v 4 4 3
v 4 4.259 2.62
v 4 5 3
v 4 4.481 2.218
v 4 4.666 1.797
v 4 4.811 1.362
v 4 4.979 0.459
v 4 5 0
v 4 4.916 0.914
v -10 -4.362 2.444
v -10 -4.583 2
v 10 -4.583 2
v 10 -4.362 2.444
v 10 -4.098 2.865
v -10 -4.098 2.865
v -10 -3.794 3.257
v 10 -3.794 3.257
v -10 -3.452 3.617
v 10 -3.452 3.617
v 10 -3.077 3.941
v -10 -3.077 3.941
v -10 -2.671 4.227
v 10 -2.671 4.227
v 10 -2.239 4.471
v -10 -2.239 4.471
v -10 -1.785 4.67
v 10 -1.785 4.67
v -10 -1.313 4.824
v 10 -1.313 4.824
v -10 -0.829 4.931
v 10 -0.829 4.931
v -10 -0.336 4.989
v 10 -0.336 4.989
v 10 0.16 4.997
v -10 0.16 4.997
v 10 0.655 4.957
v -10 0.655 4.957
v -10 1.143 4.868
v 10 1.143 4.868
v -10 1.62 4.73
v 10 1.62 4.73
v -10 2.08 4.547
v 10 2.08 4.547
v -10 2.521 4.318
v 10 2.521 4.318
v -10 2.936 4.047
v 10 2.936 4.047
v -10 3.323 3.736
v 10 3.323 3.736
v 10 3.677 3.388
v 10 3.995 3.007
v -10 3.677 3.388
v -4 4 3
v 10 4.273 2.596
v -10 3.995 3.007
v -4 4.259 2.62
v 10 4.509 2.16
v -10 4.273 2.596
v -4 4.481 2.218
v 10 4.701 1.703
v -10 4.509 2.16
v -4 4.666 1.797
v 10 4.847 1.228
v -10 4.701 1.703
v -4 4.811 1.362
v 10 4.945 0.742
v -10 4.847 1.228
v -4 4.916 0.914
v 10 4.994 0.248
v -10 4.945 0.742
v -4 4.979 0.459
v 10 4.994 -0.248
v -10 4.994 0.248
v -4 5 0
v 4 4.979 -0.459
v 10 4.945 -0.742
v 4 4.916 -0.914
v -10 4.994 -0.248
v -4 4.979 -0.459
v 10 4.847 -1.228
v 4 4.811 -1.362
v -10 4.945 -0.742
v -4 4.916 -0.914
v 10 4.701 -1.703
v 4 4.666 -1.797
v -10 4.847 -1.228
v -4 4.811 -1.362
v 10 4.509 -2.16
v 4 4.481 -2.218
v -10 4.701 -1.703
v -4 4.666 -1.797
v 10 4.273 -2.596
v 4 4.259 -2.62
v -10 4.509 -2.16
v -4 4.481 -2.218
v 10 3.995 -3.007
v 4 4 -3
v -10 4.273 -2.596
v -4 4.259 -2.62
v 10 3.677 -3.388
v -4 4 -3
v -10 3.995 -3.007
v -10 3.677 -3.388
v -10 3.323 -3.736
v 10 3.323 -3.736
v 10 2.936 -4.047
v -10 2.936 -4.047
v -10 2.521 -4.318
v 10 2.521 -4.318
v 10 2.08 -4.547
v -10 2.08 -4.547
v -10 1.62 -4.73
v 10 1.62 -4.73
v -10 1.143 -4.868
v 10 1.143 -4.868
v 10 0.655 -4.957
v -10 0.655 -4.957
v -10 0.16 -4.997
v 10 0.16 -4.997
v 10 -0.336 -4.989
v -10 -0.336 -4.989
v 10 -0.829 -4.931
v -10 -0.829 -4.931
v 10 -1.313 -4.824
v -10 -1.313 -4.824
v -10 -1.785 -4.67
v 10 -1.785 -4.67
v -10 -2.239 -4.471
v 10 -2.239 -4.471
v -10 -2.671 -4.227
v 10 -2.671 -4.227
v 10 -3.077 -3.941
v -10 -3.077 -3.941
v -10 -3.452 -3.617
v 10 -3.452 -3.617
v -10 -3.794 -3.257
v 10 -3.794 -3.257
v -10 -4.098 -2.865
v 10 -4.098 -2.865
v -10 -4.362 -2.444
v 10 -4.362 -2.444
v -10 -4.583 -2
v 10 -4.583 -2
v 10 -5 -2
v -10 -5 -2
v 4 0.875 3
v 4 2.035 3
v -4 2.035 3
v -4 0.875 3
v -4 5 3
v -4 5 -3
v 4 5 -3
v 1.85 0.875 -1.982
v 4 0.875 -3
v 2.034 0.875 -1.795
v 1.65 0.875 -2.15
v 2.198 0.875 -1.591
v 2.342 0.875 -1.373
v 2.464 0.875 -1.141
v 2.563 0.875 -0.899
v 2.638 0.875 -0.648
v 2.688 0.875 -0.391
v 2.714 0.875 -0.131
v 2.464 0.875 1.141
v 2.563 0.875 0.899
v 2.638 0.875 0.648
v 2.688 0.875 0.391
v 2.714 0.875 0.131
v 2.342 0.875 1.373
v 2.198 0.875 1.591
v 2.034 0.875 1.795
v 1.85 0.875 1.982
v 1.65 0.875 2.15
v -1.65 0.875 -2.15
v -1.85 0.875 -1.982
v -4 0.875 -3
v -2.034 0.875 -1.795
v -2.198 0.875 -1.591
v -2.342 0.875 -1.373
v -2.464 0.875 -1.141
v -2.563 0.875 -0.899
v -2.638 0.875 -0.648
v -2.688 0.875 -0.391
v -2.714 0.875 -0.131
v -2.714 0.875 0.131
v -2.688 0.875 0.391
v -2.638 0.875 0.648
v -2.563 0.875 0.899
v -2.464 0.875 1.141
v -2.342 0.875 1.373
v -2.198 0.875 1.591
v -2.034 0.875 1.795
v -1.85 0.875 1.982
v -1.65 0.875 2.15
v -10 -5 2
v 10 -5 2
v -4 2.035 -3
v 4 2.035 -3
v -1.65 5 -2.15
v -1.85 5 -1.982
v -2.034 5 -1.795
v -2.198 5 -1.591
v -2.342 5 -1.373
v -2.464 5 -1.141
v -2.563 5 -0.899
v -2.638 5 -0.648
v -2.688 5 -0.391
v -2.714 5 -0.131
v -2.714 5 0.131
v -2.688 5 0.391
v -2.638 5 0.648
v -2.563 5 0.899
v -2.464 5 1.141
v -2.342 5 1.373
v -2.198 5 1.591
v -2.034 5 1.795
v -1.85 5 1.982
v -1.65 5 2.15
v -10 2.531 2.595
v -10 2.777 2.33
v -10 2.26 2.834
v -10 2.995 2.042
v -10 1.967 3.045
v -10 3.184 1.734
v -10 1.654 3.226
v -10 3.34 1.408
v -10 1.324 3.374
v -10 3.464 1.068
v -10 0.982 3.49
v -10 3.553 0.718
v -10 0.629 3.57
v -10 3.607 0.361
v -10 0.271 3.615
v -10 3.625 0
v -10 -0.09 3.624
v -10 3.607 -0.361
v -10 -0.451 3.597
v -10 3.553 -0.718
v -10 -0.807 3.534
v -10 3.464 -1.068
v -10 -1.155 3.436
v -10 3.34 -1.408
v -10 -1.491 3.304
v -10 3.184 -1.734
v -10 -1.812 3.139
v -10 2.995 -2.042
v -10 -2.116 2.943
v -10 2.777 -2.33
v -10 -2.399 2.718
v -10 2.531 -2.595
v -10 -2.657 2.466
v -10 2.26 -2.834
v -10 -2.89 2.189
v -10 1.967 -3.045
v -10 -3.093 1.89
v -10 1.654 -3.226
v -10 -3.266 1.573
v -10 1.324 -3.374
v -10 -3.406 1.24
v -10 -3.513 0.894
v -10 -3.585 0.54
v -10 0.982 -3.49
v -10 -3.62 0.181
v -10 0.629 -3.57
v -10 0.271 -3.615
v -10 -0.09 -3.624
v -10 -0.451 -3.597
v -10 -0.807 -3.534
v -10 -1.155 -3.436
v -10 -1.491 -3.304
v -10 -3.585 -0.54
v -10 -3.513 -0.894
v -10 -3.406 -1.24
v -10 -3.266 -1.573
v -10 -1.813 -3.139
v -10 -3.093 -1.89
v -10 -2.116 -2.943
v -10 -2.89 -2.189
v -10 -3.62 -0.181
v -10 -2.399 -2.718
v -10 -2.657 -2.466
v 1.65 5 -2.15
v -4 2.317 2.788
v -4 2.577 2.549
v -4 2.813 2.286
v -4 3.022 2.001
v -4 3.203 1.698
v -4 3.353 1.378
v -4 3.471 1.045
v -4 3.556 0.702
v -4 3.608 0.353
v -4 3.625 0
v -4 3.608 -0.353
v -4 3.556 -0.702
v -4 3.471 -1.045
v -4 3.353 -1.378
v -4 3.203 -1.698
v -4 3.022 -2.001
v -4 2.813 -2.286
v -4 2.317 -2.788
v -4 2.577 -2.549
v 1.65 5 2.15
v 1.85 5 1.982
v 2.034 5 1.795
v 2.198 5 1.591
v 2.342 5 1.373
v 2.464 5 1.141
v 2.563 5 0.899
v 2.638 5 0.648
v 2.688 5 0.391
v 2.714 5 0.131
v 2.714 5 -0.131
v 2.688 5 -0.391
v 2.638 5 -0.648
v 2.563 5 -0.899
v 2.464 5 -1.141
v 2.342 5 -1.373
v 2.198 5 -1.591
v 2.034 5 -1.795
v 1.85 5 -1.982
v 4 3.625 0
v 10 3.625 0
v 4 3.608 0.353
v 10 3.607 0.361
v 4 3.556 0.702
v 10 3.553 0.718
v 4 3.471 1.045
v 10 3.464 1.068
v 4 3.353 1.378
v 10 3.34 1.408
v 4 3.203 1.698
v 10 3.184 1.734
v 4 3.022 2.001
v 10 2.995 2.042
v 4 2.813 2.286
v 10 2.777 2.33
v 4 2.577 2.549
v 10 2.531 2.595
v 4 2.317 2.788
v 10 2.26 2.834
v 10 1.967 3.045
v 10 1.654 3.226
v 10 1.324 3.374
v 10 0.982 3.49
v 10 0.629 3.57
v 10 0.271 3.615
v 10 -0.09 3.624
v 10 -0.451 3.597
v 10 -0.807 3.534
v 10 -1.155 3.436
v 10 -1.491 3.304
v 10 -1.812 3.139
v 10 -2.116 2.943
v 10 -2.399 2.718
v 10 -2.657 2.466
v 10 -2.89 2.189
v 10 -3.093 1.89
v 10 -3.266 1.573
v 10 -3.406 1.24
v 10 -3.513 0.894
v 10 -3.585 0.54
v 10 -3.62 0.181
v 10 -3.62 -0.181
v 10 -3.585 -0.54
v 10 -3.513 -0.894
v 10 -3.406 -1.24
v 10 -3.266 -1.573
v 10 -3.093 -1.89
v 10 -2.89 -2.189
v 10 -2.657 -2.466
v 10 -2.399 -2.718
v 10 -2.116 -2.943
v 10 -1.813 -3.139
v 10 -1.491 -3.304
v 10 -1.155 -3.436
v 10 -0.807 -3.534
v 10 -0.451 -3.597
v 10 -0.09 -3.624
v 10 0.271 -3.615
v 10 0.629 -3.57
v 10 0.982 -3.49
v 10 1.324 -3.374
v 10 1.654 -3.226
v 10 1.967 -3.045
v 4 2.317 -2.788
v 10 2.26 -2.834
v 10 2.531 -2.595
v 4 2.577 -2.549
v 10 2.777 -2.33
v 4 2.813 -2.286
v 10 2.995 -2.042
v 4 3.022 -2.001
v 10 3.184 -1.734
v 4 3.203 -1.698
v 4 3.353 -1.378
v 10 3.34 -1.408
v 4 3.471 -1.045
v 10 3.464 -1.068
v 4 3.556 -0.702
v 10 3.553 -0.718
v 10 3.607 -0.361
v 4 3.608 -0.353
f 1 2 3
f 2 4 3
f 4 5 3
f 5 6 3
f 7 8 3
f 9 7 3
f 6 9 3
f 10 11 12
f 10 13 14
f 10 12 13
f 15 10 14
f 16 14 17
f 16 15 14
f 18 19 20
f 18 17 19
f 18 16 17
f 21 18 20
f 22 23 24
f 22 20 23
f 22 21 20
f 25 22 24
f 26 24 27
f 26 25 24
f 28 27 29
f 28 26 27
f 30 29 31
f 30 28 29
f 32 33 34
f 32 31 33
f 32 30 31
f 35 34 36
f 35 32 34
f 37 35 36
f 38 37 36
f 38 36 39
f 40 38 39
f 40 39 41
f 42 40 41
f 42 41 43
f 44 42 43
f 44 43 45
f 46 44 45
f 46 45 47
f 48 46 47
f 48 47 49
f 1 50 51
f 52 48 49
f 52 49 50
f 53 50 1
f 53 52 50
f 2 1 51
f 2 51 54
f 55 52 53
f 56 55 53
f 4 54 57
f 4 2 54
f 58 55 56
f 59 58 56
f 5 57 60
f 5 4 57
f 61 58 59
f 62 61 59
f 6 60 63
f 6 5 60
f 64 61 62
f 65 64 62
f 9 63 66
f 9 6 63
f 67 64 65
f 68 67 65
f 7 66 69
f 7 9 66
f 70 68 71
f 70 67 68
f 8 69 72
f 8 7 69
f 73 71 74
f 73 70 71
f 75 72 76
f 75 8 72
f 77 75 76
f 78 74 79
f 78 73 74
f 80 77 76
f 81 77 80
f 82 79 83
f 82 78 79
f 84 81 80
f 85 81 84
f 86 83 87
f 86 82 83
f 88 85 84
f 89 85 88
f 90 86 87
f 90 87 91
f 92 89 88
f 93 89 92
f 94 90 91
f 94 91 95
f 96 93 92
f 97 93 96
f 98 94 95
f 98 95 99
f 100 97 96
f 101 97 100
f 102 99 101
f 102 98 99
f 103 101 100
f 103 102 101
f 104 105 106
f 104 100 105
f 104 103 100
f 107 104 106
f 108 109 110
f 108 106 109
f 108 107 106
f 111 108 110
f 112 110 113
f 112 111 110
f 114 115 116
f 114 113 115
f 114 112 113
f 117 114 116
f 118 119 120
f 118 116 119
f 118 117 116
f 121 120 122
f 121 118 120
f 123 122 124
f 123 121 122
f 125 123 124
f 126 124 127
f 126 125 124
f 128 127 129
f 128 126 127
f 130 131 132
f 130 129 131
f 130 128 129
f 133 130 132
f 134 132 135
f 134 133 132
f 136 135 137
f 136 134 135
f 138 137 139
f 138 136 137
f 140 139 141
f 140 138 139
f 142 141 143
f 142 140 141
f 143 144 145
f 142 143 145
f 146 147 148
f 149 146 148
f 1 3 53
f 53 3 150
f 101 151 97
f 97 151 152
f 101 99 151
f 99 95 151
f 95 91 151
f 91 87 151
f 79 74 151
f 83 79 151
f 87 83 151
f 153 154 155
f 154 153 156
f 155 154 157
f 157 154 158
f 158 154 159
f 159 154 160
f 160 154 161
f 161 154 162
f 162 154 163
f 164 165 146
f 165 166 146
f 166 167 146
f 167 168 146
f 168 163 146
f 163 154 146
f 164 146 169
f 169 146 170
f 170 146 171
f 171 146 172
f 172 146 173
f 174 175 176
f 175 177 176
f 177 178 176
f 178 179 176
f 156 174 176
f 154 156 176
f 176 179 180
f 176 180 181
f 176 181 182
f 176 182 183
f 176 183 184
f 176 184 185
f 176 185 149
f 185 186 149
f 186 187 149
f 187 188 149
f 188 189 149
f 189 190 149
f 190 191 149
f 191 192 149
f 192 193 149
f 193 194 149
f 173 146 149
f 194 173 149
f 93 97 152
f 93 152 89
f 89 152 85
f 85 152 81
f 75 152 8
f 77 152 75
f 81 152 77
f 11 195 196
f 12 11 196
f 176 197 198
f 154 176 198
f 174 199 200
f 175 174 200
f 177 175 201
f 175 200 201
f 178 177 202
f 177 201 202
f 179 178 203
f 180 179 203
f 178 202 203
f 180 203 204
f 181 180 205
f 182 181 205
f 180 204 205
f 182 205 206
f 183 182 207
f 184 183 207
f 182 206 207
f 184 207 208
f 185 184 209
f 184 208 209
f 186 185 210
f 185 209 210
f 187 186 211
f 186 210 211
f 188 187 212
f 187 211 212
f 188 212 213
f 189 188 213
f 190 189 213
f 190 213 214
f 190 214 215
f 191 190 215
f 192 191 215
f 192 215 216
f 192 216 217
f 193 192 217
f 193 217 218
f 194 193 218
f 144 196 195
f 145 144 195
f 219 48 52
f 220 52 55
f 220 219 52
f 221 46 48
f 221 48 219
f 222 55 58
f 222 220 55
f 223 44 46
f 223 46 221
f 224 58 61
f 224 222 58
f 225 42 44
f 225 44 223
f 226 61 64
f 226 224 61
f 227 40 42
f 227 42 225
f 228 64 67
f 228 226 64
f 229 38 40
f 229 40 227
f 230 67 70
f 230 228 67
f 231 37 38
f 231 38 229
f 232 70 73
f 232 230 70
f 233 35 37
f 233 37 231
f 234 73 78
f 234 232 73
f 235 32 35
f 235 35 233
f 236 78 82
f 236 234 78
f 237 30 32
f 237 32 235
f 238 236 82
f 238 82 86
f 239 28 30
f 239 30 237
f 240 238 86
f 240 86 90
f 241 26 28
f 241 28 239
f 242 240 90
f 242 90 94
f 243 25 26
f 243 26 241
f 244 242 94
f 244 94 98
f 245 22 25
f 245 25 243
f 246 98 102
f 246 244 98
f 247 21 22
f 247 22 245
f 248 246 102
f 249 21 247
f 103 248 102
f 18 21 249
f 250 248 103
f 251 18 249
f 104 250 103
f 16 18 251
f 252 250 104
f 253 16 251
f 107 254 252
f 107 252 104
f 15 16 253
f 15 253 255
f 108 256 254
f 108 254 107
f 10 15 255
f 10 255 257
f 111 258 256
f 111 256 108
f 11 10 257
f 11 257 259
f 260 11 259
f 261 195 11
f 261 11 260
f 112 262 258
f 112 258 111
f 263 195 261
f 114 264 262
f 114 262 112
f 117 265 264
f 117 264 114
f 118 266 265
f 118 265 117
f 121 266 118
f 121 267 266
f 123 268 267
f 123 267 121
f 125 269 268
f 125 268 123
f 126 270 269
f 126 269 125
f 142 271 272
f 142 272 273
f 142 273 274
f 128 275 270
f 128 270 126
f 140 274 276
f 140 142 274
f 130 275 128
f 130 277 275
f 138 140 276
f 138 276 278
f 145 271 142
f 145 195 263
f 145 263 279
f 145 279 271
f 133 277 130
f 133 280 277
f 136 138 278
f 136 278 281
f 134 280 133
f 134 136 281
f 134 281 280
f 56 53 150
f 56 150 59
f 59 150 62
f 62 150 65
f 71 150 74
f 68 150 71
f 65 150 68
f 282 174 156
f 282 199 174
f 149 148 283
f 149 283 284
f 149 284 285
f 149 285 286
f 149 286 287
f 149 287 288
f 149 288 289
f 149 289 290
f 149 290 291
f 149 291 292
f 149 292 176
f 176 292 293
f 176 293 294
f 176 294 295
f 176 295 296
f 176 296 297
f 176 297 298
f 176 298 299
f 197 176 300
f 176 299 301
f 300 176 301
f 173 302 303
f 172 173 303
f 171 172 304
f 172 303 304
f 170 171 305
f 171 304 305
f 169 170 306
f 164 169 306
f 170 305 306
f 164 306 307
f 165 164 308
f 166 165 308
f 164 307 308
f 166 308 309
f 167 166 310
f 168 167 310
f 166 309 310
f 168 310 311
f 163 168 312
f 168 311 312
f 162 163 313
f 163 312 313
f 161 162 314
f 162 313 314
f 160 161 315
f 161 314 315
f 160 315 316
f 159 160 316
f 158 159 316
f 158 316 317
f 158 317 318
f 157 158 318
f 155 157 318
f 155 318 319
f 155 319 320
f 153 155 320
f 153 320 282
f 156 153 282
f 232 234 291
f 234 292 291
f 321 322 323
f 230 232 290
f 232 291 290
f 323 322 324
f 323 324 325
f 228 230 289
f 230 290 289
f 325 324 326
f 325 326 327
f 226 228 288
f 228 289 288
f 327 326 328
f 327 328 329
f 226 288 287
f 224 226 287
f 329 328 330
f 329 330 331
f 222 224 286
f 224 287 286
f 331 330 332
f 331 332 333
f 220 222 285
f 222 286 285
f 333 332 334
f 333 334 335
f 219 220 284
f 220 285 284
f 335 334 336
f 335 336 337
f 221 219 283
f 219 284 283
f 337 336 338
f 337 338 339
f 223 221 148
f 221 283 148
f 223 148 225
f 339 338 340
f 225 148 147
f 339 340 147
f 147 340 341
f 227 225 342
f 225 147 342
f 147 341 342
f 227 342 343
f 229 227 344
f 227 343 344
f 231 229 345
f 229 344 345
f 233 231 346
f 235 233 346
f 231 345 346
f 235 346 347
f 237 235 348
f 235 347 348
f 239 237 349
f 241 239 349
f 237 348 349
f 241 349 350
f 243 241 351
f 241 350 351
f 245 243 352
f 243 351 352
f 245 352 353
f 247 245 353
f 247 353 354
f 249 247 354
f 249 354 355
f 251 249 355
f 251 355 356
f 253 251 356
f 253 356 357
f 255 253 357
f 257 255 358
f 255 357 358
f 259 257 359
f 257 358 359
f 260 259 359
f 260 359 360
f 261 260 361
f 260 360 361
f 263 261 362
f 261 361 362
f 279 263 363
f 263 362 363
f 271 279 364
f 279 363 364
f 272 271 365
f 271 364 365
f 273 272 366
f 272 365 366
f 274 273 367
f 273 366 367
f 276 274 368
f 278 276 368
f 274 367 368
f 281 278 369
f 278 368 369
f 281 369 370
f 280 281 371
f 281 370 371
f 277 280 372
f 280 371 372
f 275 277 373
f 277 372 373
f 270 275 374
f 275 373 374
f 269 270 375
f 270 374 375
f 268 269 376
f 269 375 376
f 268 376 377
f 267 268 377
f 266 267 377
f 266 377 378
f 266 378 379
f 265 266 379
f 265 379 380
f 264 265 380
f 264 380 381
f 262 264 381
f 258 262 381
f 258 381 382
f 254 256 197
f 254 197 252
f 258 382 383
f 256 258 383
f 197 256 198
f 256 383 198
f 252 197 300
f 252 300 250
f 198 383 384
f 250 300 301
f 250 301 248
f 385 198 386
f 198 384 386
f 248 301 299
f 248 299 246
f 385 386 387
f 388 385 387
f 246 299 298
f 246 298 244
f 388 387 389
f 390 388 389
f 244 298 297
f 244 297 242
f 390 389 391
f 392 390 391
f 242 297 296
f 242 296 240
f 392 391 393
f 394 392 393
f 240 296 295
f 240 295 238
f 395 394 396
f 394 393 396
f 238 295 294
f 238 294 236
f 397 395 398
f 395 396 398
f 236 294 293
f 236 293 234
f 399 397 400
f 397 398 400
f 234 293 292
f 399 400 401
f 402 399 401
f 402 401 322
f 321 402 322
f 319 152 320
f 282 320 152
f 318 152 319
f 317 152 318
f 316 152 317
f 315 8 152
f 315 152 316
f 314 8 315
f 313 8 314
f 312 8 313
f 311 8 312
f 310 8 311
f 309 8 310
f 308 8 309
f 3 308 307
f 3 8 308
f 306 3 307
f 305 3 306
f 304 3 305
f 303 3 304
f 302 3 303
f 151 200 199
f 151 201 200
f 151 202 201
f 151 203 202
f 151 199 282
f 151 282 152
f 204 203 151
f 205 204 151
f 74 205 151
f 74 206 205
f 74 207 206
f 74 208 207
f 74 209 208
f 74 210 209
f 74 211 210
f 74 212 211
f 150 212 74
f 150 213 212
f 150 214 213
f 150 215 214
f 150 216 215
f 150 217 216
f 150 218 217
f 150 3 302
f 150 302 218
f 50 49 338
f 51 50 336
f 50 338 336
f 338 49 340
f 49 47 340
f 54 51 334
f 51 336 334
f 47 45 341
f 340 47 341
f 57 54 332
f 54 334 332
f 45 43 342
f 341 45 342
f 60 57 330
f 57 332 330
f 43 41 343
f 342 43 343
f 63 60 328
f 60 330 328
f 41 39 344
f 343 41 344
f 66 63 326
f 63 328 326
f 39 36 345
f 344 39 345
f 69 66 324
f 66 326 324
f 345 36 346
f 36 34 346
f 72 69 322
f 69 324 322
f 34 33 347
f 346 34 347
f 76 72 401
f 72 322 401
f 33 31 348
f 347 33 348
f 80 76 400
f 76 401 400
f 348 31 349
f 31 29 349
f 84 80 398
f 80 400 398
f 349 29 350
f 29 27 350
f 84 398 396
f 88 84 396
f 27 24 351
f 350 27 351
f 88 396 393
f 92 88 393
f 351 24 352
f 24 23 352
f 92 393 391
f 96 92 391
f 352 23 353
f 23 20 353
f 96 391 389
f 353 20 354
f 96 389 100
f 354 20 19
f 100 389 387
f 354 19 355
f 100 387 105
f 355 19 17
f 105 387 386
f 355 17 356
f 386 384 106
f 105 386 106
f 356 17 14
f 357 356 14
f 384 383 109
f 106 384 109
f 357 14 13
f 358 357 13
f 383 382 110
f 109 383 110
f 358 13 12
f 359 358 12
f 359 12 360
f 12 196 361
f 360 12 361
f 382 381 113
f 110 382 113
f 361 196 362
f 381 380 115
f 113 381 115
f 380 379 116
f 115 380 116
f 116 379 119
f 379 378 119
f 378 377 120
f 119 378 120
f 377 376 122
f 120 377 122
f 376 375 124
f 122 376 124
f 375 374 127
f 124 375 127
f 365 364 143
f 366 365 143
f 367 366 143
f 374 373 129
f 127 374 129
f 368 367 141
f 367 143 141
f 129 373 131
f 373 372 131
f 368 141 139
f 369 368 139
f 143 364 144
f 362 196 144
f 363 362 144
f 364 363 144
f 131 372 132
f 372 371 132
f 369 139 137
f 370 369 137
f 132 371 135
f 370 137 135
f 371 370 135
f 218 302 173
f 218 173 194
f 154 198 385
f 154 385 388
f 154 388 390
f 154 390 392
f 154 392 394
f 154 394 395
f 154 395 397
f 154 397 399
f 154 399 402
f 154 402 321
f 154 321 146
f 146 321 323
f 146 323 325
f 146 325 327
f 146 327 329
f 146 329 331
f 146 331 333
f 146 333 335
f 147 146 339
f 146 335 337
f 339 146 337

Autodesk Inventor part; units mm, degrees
ref_plane "YZ Plane" through (0, 0, 0) normal (1, 0, 0) x (0, 1, 0)
ref_plane "XY Plane" through (0, 0, 0) normal (0, 0, 1) x (1, 0, 0)
sketch "Sketch1" plane through (0, 0, 0) normal (1, 0, 0) x (0, 1, 0)
  circle A0 centre (0, 0) radius 3.625
  circle A1 centre (0, 0) radius 5
  dimension "d0" = 7.25
  dimension "d1" = 10
extrude "Extrusion1" add sketch "Sketch1" along normal mid plane 20
ref_plane "Work Plane1" through (0, 5, 0) normal (0, 1, 0) x (-1, 0, 0)
sketch "Sketch2" plane through (0, 5, 0) normal (0, 1, 0) x (-1, 0, 0)
  line L0 (-1.65, 2.15) -> (1.65, 2.15)
  line L1 (1.65, 2.15) -> (1.65, -2.15)
  line L2 (1.65, -2.15) -> (-1.65, -2.15)
  line L3 (-1.65, -2.15) -> (-1.65, 2.15)
  line L4 (-1.65, 2.15) -> (1.65, -2.15) construction
  line L5 (1.65, 2.15) -> (-1.65, -2.15) construction
  line L6 (-4, 3) -> (4, 3)
  line L7 (4, 3) -> (4, -3)
  line L8 (4, -3) -> (-4, -3)
  line L9 (-4, -3) -> (-4, 3)
  line L10 (-4, 3) -> (4, -3) construction
  line L11 (4, 3) -> (-4, -3) construction
  arc A0 (1.65, -2.15) -> (1.65, 2.15) centre (0.0168, 0) ccw
  arc A1 (-1.65, 2.15) -> (-1.65, -2.15) centre (-0.0168, 0) ccw
  point P0 (0, 0)
  dimension "d4" = 3.3
  dimension "d5" = 4.3
  dimension "d9" = 8
  dimension "d10" = 6
  dimension "d15" = 2.7
  dimension "d16" = 2.7
extrude "Extrusion2" add sketch "Sketch2" against normal blind 4.125 contours L0 L1 L2 L3 | L3 A1 | A0 L1 | L6 L7 L8 L9
extrude "Extrusion3" cut sketch "Sketch2" against normal up to surface (4.125 mm away) contours L0 L1 L2 L3 | L3 A1 | A0 L1
ref_plane "Work Plane2" through (0, -5, 0) normal (0, 1, 0) x (-1, 0, 0)
sketch "Sketch3" plane through (0, -5, 0) normal (0, 1, 0) x (-1, 0, 0)
  line L0 (10, 3.625) -> (10, -3.625) projected
  line L1 (-10, 5) -> (-10, -5) projected
  line L2 (10, 2) -> (-10, 2)
  line L3 (-10, 2) -> (-10, -2)
  line L4 (-10, -2) -> (10, -2)
  line L5 (10, -2) -> (10, 2)
  point P0 (0, 0)
  point P1 (0, 2)
  dimension "d17" = 4
  dimension "d18" = 2
extrude "Extrusion4" add sketch "Sketch3" along normal blind 1
properties part number "part_holder"
